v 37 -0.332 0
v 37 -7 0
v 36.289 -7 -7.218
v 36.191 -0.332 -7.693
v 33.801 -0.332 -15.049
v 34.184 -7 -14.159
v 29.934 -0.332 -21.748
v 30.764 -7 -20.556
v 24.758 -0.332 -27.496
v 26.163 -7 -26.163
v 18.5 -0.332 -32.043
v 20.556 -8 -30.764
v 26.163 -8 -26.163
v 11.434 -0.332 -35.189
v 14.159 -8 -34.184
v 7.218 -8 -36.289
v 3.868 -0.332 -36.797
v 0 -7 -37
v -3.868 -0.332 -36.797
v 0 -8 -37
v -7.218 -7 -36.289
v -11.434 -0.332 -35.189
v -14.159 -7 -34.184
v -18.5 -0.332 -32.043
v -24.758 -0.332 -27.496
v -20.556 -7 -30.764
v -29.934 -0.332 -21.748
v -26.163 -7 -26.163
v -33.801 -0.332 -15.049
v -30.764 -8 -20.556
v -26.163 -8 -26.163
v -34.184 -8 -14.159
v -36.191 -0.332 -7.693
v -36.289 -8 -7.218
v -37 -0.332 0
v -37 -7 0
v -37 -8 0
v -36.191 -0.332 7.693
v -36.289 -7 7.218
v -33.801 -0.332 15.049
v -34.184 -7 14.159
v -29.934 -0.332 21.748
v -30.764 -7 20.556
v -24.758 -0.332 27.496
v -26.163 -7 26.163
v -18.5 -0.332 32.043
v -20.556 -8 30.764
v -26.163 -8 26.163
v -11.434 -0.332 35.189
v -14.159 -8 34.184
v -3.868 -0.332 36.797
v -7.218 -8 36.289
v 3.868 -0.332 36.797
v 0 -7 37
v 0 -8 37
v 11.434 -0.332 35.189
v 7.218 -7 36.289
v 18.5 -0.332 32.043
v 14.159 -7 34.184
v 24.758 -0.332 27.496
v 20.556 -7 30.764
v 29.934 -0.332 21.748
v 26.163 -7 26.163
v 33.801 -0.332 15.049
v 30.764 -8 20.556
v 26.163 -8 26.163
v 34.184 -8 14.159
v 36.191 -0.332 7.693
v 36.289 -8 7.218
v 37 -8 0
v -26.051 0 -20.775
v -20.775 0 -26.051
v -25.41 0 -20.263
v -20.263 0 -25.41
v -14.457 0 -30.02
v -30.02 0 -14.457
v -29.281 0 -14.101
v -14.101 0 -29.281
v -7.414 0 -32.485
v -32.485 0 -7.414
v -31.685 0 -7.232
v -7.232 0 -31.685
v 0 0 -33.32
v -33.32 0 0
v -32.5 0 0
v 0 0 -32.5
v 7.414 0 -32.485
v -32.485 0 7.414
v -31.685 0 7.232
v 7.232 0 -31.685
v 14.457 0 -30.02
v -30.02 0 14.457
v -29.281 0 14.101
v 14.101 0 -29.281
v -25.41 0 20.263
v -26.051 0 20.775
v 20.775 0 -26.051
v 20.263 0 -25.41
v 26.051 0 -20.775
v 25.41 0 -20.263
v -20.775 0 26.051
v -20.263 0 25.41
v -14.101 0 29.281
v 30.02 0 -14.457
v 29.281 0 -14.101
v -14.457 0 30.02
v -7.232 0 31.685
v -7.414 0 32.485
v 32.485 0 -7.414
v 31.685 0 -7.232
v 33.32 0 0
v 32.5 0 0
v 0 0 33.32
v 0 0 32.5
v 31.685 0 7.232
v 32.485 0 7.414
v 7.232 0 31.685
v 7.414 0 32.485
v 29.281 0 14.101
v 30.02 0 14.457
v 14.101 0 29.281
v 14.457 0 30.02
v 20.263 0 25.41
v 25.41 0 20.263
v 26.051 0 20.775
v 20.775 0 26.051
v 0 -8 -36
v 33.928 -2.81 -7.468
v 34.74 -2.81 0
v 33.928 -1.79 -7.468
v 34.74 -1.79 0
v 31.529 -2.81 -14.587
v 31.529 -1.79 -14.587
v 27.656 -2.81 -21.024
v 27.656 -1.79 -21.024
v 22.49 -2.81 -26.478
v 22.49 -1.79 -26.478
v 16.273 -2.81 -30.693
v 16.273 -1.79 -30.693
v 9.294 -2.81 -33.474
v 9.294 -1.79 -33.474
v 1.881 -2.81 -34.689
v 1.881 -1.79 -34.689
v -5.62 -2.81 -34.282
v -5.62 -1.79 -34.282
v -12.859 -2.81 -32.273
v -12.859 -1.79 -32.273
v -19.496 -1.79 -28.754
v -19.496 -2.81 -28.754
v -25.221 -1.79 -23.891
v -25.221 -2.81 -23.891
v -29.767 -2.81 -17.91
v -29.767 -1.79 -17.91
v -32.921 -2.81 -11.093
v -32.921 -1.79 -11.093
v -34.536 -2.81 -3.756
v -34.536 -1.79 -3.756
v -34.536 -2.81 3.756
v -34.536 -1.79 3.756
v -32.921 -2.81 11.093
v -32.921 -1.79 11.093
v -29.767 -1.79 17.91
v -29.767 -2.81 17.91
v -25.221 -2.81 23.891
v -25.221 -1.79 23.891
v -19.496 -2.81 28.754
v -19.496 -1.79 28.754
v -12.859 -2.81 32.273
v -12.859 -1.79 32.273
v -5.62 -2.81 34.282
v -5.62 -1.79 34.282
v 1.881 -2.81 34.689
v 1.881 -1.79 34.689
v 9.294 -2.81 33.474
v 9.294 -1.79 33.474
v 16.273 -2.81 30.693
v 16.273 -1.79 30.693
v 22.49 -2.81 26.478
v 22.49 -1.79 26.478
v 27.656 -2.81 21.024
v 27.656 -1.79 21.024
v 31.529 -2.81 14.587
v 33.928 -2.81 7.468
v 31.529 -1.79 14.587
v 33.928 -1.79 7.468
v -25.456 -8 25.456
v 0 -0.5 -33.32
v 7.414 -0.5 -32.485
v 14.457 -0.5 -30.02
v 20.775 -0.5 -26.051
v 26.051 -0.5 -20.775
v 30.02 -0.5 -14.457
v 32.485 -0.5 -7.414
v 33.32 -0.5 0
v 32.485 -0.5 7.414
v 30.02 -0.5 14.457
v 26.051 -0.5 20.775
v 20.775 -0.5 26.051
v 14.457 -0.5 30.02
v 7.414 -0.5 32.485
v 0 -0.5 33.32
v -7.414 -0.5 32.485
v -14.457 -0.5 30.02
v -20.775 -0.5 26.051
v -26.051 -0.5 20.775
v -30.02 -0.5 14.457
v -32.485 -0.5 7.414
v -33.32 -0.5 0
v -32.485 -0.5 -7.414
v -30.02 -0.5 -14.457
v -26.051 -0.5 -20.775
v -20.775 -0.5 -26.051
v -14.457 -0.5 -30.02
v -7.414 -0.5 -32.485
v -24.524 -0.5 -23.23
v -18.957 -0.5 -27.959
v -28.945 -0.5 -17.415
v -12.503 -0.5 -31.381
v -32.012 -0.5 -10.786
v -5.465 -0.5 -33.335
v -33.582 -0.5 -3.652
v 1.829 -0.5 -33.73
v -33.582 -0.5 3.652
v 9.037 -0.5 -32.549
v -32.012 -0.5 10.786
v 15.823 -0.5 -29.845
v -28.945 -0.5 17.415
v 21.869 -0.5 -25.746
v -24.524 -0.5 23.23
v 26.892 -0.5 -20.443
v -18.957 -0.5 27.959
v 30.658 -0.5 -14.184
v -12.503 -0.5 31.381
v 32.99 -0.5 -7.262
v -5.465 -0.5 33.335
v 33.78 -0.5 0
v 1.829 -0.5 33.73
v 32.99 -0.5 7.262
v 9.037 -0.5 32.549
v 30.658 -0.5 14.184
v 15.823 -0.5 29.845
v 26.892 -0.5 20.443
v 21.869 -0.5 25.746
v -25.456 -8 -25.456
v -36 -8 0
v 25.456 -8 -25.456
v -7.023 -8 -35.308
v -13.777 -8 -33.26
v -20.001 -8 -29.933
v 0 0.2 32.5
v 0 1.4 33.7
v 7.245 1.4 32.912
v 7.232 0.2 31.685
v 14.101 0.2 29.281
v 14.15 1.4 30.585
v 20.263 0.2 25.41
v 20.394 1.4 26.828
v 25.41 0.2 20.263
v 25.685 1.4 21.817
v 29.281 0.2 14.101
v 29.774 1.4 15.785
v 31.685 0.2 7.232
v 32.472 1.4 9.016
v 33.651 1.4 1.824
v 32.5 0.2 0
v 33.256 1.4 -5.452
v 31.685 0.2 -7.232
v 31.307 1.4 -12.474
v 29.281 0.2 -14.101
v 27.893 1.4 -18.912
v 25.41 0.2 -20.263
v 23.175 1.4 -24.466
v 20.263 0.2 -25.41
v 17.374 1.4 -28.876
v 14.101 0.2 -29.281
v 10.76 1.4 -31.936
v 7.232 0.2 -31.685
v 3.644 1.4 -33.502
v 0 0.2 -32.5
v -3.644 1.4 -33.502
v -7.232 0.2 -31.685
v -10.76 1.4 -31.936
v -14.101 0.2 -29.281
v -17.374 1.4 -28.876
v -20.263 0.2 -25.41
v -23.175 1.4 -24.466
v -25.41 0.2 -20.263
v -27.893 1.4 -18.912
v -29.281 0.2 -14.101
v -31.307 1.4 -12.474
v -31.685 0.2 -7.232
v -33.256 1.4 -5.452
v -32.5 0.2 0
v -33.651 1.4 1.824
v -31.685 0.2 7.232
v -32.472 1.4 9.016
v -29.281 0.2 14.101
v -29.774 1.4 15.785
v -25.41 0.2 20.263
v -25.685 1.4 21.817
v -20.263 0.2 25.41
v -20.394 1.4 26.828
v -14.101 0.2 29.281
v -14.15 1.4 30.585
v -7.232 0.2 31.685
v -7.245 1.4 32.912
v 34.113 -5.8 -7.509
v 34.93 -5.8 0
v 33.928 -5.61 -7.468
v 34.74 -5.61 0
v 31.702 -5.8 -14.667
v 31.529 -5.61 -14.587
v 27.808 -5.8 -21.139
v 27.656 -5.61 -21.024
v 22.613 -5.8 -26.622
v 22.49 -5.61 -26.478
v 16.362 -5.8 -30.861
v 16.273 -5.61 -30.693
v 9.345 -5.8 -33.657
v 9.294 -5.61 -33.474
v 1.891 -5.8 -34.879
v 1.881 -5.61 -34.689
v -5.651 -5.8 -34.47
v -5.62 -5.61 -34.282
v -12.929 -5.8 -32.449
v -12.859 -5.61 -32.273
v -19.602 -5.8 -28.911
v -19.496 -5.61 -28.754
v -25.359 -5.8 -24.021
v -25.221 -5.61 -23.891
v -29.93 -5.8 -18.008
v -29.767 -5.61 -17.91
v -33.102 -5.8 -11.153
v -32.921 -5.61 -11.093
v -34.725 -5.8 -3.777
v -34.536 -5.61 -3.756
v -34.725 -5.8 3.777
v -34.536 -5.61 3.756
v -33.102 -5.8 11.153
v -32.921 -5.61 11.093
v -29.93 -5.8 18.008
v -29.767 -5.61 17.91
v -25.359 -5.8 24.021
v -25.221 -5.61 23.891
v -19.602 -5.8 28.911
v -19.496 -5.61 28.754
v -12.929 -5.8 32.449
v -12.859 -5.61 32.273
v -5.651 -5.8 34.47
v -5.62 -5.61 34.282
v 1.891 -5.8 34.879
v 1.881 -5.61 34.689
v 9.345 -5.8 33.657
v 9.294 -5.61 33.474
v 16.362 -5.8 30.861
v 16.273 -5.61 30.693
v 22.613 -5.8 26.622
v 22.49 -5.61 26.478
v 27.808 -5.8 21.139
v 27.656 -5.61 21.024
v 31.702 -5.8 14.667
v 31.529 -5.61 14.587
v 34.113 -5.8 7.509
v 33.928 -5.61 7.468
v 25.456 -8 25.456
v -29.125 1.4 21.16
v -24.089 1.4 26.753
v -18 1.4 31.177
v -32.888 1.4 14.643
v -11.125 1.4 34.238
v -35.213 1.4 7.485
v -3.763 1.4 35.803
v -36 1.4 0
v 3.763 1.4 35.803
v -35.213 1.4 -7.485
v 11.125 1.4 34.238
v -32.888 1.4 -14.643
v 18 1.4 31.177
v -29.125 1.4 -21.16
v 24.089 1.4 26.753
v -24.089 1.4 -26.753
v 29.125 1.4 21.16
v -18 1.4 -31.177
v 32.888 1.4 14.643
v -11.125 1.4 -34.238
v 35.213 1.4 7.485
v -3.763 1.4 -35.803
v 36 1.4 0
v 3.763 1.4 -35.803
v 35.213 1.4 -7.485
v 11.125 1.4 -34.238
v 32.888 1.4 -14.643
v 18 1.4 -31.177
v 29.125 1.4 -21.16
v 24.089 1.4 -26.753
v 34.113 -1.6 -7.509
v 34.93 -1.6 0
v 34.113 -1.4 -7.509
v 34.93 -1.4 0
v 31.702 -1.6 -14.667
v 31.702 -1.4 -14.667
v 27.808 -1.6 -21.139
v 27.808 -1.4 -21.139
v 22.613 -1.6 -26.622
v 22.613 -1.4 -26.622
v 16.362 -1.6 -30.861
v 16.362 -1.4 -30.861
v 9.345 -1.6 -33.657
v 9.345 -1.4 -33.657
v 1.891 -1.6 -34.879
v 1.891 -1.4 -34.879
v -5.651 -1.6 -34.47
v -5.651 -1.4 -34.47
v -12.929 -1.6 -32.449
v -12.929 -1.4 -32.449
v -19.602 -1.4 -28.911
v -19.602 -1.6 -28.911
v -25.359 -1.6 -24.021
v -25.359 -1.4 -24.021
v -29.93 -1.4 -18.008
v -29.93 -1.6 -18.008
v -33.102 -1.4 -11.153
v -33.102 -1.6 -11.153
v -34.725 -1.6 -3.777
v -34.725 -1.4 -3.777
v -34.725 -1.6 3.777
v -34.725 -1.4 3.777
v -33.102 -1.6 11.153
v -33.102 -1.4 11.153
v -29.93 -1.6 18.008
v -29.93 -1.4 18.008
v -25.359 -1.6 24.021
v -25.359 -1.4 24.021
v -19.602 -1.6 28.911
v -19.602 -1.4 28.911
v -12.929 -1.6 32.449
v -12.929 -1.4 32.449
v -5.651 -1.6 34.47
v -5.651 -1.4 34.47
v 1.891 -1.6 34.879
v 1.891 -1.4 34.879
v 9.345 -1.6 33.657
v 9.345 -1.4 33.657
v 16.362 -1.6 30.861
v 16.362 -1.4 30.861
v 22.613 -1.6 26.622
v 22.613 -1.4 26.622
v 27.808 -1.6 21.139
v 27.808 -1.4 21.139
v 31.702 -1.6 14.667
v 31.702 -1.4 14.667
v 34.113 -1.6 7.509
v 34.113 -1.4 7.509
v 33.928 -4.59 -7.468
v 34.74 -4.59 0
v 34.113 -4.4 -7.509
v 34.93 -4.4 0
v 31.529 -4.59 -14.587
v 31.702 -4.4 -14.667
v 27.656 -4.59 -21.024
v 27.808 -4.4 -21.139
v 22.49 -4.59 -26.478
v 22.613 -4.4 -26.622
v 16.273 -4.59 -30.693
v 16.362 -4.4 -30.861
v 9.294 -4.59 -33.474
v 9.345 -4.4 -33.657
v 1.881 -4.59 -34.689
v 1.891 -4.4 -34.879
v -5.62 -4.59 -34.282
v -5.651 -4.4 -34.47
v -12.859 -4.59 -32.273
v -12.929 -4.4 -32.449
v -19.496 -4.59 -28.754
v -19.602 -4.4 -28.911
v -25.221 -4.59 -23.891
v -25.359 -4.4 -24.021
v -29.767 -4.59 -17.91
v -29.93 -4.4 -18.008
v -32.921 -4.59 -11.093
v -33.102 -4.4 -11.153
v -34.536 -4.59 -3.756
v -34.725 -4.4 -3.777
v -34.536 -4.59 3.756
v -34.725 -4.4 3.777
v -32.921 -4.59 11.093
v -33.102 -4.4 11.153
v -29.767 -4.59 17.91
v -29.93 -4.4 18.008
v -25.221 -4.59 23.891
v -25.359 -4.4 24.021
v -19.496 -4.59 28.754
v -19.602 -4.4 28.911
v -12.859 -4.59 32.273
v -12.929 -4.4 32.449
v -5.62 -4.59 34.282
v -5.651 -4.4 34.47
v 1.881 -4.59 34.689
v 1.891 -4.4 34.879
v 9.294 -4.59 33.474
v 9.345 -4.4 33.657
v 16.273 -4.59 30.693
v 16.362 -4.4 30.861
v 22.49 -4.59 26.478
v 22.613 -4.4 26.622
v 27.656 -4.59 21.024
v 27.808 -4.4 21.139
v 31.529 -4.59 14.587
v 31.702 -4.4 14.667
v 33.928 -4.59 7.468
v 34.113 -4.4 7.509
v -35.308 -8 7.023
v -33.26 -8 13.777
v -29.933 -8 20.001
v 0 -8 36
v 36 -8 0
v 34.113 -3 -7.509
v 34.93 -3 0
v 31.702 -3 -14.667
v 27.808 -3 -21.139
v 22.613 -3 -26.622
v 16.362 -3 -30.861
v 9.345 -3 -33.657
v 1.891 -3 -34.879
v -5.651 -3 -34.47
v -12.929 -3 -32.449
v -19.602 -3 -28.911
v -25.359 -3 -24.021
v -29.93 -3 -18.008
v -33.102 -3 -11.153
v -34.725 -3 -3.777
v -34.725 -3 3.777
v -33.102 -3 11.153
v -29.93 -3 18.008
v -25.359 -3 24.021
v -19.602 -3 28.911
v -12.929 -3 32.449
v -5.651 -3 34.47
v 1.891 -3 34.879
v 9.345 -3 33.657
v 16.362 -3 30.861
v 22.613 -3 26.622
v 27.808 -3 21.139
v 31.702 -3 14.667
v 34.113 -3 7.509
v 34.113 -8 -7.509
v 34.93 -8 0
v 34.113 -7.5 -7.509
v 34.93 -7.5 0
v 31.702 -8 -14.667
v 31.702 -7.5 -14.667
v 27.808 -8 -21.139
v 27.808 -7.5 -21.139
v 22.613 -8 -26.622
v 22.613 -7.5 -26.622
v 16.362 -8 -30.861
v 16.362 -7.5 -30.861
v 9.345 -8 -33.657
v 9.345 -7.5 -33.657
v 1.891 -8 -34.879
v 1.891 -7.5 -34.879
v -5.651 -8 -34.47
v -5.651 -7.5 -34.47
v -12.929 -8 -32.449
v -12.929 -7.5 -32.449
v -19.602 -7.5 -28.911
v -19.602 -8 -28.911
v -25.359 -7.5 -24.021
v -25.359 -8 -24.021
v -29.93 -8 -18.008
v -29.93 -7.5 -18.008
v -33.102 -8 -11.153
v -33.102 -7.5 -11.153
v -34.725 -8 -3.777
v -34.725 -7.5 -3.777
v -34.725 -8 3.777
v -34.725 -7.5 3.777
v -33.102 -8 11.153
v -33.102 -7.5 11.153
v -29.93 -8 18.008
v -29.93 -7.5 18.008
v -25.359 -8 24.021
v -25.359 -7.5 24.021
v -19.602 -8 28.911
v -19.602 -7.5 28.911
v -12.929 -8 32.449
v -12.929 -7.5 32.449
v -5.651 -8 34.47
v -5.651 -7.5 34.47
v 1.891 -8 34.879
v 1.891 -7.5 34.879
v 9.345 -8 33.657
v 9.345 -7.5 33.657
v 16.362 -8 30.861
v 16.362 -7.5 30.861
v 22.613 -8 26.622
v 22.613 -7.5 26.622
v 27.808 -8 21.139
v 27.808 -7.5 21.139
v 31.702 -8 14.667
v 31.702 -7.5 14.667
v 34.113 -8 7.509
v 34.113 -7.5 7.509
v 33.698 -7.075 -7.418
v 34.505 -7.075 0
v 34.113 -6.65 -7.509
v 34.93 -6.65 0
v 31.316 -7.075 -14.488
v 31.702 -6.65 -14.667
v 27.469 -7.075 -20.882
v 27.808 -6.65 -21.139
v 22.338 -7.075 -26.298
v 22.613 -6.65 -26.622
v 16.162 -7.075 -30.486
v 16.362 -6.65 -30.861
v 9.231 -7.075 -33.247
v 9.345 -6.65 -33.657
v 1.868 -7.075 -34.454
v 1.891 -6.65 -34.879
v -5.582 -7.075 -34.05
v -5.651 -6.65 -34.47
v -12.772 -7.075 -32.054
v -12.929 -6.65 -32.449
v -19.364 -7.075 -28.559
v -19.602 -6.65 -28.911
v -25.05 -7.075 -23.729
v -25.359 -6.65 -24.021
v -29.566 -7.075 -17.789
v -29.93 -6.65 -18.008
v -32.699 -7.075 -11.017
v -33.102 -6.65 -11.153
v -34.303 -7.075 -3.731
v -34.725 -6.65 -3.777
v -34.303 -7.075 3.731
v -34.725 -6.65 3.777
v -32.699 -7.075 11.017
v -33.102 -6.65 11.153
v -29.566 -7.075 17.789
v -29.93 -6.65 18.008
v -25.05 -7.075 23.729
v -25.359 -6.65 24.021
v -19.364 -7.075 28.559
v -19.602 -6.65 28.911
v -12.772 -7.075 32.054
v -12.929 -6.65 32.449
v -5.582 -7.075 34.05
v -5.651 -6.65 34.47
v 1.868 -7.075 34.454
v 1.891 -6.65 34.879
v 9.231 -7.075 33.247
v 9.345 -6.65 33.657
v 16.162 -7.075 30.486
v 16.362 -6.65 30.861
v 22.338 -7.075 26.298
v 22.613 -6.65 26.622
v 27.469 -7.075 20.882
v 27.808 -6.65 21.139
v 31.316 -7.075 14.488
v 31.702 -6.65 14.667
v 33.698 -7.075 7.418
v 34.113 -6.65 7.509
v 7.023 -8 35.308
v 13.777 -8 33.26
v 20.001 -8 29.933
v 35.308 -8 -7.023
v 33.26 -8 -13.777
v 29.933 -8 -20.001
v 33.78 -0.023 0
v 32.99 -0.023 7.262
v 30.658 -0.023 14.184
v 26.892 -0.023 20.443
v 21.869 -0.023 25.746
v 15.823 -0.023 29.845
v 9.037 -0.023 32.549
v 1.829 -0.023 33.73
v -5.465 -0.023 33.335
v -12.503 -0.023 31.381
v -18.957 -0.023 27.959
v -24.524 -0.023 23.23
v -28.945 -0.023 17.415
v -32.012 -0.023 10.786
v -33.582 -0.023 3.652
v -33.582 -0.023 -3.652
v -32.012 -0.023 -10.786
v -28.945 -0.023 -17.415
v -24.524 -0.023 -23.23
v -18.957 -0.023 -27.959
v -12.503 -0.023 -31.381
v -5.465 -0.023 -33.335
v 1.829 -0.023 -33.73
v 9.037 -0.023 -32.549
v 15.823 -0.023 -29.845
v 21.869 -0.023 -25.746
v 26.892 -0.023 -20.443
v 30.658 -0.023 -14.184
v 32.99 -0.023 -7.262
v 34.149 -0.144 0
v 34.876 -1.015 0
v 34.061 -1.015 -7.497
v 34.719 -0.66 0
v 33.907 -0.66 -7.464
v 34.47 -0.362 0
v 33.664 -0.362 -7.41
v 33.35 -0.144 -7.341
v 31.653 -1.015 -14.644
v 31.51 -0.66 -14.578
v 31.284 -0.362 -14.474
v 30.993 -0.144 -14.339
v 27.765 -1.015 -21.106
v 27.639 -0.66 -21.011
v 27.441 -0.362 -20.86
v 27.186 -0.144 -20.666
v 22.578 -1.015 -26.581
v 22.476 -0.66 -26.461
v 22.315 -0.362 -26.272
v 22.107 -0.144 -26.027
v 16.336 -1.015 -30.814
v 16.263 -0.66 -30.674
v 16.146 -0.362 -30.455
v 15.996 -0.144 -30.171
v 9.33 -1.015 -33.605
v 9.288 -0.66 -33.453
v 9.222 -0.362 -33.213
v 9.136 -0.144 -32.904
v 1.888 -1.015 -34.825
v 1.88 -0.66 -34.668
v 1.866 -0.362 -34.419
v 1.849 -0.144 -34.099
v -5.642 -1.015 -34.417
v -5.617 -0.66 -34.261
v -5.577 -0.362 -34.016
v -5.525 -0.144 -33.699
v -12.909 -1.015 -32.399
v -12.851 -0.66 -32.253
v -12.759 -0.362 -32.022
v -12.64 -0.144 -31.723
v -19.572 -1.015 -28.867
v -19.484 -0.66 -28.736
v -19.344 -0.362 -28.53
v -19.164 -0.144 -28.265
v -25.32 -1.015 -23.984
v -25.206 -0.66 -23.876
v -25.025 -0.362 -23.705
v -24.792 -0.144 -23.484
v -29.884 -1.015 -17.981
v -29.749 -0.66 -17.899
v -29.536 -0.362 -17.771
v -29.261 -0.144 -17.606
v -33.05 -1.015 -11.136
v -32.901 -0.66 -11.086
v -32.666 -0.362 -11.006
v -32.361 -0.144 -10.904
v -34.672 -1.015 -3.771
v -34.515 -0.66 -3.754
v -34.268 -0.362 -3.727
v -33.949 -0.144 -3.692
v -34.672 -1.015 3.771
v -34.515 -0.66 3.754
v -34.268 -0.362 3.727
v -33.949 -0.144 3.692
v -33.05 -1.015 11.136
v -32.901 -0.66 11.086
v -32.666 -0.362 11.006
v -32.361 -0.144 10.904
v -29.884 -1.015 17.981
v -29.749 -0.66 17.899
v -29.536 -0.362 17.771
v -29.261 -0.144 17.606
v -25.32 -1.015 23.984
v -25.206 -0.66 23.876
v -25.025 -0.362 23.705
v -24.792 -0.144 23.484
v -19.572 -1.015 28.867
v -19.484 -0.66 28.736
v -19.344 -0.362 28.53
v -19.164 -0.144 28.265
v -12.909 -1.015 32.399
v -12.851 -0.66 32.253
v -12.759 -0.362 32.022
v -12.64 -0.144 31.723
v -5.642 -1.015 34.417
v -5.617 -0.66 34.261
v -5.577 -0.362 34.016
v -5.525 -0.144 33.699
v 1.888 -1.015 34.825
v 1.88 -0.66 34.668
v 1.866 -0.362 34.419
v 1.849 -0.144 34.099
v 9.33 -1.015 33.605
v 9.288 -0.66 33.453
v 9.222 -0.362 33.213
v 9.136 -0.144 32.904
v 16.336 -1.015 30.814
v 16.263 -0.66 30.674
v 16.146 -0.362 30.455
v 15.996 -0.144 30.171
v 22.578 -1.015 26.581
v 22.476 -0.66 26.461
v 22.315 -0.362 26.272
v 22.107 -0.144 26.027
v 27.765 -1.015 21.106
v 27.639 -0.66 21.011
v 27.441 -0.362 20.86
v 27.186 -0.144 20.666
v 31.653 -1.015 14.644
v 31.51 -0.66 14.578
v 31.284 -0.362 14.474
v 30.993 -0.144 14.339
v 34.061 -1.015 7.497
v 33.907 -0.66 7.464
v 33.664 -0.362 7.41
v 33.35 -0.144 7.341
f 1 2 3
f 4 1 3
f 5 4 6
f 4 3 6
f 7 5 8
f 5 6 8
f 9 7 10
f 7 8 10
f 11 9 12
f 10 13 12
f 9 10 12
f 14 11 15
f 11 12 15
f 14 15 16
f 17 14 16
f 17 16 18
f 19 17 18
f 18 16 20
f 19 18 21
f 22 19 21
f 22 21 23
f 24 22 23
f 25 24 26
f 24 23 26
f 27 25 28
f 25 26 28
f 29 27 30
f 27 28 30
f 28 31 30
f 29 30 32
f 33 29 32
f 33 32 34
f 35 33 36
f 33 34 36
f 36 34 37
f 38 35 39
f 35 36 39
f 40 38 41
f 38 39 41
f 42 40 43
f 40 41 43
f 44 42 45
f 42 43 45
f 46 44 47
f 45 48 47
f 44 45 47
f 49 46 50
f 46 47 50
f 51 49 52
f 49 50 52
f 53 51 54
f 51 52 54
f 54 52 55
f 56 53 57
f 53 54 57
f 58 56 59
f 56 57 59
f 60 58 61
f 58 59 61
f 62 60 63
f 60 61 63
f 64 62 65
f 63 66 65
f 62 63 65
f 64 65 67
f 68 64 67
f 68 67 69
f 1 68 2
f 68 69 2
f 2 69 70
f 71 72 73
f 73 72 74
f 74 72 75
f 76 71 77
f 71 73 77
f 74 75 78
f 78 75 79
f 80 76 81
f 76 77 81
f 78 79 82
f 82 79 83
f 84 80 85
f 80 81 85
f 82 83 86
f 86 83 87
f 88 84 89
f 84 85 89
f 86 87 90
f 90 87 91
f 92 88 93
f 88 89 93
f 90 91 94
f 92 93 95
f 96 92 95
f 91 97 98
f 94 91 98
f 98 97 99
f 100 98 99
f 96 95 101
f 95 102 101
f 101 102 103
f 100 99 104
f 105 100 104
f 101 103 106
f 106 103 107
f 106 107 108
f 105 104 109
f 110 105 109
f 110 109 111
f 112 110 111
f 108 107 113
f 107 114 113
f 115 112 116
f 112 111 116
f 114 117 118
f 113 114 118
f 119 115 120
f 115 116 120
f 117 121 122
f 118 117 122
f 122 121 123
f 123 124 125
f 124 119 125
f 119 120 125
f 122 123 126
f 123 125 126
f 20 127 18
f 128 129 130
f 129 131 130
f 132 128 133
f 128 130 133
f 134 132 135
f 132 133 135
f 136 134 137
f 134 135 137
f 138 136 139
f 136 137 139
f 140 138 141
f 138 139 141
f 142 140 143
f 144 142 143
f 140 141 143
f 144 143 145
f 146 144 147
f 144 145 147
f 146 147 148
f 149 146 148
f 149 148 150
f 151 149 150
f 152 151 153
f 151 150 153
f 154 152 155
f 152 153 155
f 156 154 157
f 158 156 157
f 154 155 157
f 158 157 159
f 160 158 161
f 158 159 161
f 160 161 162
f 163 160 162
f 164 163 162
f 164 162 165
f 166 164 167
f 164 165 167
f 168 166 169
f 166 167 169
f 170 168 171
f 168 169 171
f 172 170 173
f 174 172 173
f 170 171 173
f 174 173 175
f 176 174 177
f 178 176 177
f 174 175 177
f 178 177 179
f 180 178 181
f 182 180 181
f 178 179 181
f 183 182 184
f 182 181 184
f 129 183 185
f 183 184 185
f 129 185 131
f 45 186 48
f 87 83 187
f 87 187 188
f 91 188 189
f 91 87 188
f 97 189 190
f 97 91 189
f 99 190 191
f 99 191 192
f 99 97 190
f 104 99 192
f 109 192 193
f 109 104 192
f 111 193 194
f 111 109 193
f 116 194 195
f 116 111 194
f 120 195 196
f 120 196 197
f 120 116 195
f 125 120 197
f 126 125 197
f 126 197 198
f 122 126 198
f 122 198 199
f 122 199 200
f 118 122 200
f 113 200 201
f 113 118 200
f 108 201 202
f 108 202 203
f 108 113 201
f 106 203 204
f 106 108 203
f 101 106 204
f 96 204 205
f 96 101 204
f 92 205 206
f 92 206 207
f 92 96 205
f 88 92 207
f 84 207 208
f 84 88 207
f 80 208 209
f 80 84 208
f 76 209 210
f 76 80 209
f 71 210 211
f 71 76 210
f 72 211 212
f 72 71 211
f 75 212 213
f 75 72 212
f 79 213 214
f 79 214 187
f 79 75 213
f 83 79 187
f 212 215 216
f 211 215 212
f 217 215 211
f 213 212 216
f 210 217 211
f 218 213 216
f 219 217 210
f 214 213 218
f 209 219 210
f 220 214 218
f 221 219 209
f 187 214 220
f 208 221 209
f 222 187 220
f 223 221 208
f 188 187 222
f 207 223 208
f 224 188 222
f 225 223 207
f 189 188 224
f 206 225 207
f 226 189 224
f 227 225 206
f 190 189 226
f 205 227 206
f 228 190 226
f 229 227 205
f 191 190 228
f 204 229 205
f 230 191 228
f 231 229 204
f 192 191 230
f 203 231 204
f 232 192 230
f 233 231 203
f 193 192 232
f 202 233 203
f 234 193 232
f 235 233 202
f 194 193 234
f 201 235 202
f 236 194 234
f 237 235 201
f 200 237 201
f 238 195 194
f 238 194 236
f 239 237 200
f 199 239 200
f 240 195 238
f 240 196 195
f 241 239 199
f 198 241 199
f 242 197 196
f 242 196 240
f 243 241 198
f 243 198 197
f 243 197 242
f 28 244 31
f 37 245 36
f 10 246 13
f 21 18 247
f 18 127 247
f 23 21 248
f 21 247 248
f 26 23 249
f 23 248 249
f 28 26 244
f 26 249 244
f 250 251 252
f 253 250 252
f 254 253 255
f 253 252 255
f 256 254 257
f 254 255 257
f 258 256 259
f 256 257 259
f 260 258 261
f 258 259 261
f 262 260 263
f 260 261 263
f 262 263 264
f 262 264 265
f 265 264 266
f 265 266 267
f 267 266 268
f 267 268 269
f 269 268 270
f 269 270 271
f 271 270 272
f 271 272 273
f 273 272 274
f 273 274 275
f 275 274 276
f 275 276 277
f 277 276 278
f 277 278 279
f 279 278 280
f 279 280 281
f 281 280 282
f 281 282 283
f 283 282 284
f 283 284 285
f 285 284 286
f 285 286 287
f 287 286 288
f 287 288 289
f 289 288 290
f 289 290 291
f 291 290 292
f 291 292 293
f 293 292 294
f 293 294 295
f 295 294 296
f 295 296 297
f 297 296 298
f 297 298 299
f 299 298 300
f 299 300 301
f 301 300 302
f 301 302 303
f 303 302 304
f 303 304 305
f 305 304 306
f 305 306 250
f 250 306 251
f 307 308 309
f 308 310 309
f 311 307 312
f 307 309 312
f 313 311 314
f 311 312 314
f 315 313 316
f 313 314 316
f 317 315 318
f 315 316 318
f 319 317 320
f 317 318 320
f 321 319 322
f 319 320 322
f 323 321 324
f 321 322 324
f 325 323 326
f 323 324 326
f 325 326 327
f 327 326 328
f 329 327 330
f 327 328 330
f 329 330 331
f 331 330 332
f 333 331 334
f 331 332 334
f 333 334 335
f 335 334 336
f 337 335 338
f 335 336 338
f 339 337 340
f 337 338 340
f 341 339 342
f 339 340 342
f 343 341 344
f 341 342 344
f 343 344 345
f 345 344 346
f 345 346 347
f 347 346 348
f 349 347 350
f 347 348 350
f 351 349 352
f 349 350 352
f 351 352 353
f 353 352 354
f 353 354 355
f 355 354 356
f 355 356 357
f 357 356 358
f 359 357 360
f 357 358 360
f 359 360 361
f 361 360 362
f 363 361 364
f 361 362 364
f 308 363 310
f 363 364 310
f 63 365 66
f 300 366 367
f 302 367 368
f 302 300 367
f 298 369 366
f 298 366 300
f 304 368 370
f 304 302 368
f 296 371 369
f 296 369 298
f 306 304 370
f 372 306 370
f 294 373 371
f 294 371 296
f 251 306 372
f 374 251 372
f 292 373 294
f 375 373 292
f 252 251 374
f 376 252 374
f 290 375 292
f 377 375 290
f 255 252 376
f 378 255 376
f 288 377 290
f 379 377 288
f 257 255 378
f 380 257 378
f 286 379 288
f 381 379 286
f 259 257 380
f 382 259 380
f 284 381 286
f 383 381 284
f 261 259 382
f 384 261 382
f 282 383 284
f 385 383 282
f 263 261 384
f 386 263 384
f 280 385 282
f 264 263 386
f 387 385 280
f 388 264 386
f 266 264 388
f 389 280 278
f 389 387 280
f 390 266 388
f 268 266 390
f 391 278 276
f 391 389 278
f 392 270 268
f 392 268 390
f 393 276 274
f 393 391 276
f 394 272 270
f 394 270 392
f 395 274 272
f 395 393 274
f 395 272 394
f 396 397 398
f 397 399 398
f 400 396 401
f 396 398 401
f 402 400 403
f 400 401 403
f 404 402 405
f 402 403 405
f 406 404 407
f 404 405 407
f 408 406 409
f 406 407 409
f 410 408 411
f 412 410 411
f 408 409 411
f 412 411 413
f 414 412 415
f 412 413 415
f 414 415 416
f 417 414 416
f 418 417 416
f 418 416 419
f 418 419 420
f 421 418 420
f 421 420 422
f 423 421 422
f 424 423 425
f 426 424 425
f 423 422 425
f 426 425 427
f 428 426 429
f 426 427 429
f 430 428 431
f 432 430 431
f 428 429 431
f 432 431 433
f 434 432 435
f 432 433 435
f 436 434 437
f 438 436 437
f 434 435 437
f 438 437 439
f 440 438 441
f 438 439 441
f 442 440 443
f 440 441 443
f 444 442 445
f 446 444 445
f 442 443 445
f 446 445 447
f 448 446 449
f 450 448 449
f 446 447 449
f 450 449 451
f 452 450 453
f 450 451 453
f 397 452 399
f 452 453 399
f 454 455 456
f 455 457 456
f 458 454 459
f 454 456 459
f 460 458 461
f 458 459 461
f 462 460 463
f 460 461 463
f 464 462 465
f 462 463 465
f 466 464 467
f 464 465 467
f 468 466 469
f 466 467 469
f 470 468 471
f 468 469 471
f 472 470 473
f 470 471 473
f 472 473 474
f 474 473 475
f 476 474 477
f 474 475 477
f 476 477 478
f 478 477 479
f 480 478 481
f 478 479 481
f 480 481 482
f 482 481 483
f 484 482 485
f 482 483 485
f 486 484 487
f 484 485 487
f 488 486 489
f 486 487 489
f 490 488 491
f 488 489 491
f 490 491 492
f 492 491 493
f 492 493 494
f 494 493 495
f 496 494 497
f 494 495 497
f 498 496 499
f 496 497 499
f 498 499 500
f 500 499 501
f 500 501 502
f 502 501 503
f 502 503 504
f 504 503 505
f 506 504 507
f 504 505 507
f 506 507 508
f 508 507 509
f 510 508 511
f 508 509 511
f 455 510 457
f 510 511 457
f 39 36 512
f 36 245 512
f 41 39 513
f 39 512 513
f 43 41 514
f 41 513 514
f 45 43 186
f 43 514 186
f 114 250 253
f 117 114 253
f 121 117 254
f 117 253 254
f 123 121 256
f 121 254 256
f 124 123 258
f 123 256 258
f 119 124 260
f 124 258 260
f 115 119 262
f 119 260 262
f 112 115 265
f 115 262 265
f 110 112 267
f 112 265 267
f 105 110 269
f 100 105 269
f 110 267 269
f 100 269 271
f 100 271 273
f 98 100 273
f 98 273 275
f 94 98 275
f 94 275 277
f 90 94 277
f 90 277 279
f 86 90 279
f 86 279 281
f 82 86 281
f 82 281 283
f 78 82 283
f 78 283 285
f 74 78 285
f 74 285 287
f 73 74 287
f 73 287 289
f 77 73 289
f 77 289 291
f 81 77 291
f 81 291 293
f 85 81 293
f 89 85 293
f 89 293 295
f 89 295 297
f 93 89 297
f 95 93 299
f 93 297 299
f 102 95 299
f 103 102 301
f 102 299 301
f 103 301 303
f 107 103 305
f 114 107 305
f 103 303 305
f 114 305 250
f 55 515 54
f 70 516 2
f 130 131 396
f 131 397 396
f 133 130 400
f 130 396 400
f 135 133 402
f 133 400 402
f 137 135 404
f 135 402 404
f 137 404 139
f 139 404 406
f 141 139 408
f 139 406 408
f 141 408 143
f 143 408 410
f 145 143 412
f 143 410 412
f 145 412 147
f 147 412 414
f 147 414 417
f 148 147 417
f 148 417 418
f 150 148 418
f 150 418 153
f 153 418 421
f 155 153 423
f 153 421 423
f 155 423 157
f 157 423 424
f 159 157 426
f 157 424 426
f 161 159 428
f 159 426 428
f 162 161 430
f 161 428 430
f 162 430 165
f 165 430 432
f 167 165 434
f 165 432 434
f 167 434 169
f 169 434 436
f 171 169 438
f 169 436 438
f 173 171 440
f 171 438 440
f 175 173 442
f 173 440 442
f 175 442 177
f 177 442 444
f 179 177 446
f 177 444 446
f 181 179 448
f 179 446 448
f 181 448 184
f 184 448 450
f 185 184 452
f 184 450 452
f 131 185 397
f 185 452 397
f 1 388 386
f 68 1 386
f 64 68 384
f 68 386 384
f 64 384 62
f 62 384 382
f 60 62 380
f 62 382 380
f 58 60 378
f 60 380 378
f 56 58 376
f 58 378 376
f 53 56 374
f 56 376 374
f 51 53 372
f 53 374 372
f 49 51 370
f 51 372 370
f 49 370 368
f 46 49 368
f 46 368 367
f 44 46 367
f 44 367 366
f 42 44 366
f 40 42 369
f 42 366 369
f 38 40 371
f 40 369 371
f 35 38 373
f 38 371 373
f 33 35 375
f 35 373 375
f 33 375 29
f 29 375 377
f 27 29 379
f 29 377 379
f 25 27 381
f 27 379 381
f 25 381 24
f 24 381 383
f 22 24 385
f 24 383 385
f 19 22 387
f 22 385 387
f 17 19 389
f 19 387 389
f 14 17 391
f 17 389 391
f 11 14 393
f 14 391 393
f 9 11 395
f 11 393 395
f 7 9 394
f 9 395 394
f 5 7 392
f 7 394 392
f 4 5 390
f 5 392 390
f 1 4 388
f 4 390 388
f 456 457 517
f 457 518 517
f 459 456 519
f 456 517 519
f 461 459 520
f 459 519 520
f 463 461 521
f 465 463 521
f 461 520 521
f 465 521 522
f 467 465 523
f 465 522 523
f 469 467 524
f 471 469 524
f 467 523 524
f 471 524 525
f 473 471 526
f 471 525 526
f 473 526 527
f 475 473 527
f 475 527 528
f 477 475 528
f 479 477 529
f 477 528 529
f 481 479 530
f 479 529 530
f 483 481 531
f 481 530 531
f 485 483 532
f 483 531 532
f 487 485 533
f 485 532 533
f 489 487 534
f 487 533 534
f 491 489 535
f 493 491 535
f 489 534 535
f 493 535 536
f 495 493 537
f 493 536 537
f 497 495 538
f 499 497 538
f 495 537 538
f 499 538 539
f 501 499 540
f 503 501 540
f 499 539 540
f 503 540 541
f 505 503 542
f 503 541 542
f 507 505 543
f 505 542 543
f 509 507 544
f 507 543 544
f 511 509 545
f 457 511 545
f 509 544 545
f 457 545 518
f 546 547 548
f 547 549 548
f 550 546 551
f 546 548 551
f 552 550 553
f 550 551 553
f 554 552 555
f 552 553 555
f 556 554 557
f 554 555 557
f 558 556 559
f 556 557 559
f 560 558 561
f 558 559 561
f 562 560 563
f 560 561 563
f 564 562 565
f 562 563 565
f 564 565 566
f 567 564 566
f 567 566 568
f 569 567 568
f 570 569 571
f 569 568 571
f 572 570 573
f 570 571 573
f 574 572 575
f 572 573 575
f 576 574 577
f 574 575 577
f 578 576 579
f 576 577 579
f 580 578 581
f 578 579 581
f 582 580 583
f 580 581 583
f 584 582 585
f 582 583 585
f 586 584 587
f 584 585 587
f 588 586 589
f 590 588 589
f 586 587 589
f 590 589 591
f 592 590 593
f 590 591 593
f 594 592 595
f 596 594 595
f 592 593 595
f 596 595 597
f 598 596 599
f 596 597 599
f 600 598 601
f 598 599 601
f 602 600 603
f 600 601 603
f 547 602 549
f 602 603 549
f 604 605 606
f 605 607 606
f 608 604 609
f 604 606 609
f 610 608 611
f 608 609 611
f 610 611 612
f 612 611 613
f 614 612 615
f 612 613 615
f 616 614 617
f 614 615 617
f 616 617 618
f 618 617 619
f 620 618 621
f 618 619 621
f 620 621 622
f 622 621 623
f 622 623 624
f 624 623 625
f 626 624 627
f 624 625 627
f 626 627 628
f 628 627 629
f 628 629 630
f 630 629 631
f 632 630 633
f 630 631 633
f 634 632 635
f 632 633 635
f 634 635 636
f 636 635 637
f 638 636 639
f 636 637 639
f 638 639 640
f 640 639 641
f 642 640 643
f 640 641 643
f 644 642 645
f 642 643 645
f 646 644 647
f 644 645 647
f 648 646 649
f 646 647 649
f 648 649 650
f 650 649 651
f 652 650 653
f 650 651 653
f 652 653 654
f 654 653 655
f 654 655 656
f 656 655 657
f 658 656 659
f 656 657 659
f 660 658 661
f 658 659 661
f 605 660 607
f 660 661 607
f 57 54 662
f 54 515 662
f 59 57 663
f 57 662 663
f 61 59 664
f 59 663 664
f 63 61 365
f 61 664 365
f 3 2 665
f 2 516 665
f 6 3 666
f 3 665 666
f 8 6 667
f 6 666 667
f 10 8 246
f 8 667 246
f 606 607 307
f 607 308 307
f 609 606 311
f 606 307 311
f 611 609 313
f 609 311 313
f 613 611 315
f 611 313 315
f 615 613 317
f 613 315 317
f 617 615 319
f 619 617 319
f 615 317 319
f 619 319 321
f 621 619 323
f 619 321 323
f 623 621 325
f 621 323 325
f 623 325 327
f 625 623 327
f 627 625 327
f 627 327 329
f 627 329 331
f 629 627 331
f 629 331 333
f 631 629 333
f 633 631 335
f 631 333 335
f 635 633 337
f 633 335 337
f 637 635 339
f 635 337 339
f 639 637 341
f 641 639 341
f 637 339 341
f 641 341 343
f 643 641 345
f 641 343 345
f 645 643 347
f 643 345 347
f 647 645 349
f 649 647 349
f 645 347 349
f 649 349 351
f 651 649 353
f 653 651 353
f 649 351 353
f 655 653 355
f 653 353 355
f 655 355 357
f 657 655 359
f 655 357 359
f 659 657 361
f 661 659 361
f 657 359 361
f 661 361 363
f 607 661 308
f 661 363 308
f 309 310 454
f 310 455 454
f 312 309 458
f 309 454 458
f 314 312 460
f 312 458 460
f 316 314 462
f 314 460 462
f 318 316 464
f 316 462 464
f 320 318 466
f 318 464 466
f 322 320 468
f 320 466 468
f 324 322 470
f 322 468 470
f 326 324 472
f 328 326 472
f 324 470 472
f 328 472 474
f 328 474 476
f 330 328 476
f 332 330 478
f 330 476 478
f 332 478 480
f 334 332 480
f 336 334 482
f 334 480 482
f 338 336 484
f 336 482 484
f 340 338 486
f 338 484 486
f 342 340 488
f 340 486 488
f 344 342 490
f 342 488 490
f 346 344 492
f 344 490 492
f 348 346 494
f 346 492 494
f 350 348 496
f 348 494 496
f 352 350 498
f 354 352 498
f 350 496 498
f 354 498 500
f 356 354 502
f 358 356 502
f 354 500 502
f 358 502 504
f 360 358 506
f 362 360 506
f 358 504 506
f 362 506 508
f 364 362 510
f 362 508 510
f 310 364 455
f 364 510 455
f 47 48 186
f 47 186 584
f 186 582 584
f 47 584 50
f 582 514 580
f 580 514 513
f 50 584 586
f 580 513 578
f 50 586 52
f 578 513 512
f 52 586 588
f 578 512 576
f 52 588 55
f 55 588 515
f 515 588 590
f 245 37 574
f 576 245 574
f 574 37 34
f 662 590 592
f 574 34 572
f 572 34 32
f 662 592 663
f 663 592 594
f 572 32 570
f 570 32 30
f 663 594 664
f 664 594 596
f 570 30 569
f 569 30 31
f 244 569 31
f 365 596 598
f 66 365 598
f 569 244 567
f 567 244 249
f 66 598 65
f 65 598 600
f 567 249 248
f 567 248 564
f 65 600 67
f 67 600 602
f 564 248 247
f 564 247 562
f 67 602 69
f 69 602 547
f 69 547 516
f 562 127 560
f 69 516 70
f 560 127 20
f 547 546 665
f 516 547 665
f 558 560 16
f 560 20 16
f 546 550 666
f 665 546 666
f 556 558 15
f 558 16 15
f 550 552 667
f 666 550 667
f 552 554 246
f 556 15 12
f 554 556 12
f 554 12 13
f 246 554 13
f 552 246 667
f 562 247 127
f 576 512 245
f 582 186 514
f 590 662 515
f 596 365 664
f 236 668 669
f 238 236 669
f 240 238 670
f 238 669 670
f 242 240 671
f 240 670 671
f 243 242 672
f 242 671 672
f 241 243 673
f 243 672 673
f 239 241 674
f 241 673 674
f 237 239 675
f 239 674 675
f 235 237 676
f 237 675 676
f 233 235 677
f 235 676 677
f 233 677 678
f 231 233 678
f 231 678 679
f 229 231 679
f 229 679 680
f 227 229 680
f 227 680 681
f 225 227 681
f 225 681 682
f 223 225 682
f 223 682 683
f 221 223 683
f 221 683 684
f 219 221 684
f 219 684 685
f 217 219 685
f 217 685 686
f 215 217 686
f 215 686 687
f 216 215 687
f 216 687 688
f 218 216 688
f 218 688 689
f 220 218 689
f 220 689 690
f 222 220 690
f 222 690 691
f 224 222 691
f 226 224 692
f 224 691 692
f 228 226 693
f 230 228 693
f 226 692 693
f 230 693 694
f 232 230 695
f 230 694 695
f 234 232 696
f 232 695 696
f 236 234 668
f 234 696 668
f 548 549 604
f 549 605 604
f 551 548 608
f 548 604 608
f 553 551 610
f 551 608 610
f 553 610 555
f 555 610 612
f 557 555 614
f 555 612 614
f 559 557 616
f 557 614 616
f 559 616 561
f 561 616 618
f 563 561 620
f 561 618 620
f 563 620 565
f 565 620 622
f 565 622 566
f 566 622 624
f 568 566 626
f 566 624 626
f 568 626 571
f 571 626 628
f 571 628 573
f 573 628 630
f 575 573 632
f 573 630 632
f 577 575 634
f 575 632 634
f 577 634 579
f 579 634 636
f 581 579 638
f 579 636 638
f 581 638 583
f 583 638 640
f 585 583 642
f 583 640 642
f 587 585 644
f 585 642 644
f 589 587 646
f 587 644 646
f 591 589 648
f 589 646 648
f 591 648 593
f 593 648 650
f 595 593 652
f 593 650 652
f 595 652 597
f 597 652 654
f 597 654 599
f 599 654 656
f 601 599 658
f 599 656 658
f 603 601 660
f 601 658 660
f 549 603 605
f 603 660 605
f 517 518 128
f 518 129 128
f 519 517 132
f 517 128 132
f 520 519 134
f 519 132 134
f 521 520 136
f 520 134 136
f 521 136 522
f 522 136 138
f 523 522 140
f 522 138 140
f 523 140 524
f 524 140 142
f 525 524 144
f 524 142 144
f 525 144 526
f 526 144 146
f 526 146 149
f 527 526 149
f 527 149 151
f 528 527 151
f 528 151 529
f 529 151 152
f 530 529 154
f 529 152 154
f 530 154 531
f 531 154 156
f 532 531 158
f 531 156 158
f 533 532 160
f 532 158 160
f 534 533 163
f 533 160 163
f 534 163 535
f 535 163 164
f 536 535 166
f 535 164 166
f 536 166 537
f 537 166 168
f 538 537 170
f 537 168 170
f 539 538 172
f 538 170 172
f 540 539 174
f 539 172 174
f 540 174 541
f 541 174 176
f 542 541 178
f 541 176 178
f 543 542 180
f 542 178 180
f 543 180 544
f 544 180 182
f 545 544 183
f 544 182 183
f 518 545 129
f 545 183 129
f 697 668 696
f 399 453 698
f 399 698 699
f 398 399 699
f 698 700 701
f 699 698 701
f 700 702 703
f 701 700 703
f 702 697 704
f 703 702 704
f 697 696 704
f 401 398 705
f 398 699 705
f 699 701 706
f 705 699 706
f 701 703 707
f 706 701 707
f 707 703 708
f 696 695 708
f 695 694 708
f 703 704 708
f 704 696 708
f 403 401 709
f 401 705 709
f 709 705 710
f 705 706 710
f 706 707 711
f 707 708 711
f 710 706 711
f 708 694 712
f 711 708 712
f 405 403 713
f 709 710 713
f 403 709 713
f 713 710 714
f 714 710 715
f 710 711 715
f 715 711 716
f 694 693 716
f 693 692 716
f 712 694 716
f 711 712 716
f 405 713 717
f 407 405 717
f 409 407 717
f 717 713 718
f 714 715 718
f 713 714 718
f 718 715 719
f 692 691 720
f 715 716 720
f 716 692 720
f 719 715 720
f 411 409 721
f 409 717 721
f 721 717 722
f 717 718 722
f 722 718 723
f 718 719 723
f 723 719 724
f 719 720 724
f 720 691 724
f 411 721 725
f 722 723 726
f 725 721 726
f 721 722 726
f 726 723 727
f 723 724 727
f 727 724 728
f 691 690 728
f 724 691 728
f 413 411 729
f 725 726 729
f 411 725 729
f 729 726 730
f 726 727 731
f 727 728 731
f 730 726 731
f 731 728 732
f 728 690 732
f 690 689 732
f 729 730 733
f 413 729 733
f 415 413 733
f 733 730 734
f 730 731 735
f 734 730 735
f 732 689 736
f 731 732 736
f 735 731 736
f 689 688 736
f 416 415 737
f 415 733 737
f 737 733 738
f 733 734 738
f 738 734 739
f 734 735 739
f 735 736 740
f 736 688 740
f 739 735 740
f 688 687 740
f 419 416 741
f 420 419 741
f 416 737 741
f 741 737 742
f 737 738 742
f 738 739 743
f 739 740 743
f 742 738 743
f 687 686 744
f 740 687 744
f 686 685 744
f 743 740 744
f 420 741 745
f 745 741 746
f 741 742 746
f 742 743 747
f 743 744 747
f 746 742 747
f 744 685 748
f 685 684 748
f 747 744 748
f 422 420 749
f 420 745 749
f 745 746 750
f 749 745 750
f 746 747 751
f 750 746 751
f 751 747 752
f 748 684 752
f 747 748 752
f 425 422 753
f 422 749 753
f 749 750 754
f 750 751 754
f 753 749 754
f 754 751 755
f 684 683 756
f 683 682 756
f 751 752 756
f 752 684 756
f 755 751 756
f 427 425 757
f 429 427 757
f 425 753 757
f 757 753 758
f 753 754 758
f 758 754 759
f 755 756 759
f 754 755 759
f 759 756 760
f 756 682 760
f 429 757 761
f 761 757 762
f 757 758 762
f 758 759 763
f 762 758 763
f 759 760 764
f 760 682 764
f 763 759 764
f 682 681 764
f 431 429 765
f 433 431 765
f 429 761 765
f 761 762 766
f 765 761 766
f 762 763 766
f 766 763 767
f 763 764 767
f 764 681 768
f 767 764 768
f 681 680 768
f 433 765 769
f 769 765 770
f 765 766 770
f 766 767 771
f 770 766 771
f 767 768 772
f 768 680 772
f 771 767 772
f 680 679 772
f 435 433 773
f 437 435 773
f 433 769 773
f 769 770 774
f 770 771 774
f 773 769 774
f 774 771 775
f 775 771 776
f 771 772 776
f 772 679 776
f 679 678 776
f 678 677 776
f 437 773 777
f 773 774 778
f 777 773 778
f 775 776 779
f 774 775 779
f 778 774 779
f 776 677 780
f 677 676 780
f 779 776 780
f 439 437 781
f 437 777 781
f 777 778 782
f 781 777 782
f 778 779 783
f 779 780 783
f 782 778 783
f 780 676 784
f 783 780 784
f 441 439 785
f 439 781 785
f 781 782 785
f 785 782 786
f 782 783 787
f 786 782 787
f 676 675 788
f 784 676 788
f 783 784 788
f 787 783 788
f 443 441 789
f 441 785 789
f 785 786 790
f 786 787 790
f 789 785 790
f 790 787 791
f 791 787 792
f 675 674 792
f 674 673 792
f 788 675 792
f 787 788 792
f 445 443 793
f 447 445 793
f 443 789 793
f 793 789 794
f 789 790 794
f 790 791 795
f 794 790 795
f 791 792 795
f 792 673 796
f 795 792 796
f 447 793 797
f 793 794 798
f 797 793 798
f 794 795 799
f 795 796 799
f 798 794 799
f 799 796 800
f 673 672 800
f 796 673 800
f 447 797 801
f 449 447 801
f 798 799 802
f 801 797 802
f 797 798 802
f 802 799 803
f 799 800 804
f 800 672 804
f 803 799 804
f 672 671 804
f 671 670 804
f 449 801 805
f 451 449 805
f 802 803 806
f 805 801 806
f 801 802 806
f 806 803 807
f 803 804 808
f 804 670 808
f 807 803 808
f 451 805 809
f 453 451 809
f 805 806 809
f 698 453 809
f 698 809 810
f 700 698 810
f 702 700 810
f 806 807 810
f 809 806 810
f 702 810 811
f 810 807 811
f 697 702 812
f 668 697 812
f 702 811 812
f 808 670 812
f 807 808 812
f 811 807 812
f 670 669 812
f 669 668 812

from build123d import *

# Parameters (mm, degrees)
SKETCH_1_R               = 37
EXTRUDE_1_DEPTH          = 2
SKETCH_4_R               = 32.5
CUT_EXTRUDE_1_DEPTH      = 54.272882407
CUT_EXTRUDE_START        = -0.6
SKETCH_5_R               = 37
CUT_EXTRUDE_2_DEPTH      = 0.6
CHAMFER_1_SIZE           = 1.2
CHAMFER_2_SIZE           = 1.732
CHAMFER_2_SIZE2          = 0.999970666
CUT_REVOLVE_1_ANGLE      = 45
PATTERN_CIRCULAR_1_COUNT = 4
SKETCH_7_R               = 33.78
SKETCH_7_R_2             = 33.32
EXTRUDE_2_DEPTH          = 0.5


with BuildPart() as part:
    # 草图1 → 凸台-拉伸1 (new body)
    with BuildSketch(Plane(origin=(0, 0, 0), x_dir=(1, 0, 0), z_dir=(0, 1, 0))):
        with Locations(Location((0, 0, 0), (0, 0, 270))):
            Circle(SKETCH_1_R)
    extrude(amount=EXTRUDE_1_DEPTH)

    # 草图3 → 旋转1 (revolve)
    with BuildSketch(Plane(origin=(0, 0, 0), x_dir=(0.5877852522924704, 0, -0.8090169943749496), z_dir=(0.8090169943749496, 0, 0.5877852522924704)), mode=Mode.PRIVATE) as revolve_1_sk:
        with BuildLine():
            Line((34.93, -8), (34.93, -7.5))
            Line((34.93, -7.5), (34.505, -7.075))
            Line((34.505, -7.075), (34.93, -6.65))
            Line((34.93, -6.65), (34.93, -5.8))
            Line((34.93, -5.8), (34.74, -5.61))
            Line((34.74, -5.61), (34.74, -4.59))
            Line((34.74, -4.59), (34.93, -4.4))
            Line((34.93, -4.4), (34.93, -3))
            Line((34.93, -3), (34.74, -2.81))
            Line((34.74, -2.81), (34.74, -1.79))
            Line((34.74, -1.79), (34.93, -1.6))
            Line((34.93, -1.6), (34.93, -1.4))
            ThreePointArc((34.93, -1.4), (34.519949494, -0.410050506), (33.53, 0))
            Line((33.53, 0), (37, 0))
            Line((37, 0), (37, -8))
            Line((37, -8), (34.93, -8))
        make_face()
    revolve(revolve_1_sk.sketch.rotate(Axis((0, 0, 0), (0, 1, 0)), 306), axis=Axis((0, 0, 0), (0, 1, 0)))

    # 草图4 → 切除-拉伸1 (cut, through all)
    with BuildSketch(Plane(origin=(0, 2, 0), x_dir=(1, 0, 0), z_dir=(0, 1, 0))):
        with Locations(Location((0, 0, 0), (0, 0, 270))):
            Circle(SKETCH_4_R)
    extrude(amount=-CUT_EXTRUDE_1_DEPTH, mode=Mode.SUBTRACT)

    # 草图5 → 切除-拉伸2 (cut)
    with BuildSketch(Plane(origin=(0, 2, 0), x_dir=(1, 0, 0), z_dir=(0, 1, 0)).offset(CUT_EXTRUDE_START)):
        Circle(SKETCH_5_R)
    extrude(amount=CUT_EXTRUDE_2_DEPTH, mode=Mode.SUBTRACT)

    # 倒角1
    chamfer_1_edges = [part.edges().sort_by_distance(p)[0] for p in [
        (0, 1.4, -32.5),
    ]]
    chamfer(chamfer_1_edges, length=CHAMFER_1_SIZE)

    # 倒角2
    chamfer_2_edges = [part.edges().sort_by_distance(p)[0] for p in [
        (0, 1.4, -37),
    ]]
    chamfer_2_side = [part.faces().sort_by_distance(p)[0] for p in [
        (-26.162950904, -3.3, -26.162950904),
    ]]
    chamfer(chamfer_2_edges, length=CHAMFER_2_SIZE, length2=CHAMFER_2_SIZE2, reference=chamfer_2_side[0])

    # 草图6 → 切除-旋转1 (revolve, cut)
    with BuildSketch(Plane.XY):
        Polygon((37, -8), (37, -7), (36, -8), align=None)
    cut_revolve_1 = revolve(axis=Axis((0, 0, 0), (0, 1, 0)), revolution_arc=CUT_REVOLVE_1_ANGLE, mode=Mode.SUBTRACT)

    # 阵列(圆周)1: 切除-旋转1 ×4 about axis
    pattern_circular_1_axis = Axis((0, 0, 0), (0, 1, 0))
    for i in range(1, PATTERN_CIRCULAR_1_COUNT):
        add(cut_revolve_1.rotate(pattern_circular_1_axis, i * 360 / PATTERN_CIRCULAR_1_COUNT), mode=Mode.SUBTRACT)

    # 草图7 → 凸台-拉伸2 (add)
    with BuildSketch(Plane.XZ):
        Circle(SKETCH_7_R)
        with Locations(Location((0, 0, 0), (0, 0, 270))):
            Circle(SKETCH_7_R_2, mode=Mode.SUBTRACT)
    extrude(amount=EXTRUDE_2_DEPTH)


solid = part.part
